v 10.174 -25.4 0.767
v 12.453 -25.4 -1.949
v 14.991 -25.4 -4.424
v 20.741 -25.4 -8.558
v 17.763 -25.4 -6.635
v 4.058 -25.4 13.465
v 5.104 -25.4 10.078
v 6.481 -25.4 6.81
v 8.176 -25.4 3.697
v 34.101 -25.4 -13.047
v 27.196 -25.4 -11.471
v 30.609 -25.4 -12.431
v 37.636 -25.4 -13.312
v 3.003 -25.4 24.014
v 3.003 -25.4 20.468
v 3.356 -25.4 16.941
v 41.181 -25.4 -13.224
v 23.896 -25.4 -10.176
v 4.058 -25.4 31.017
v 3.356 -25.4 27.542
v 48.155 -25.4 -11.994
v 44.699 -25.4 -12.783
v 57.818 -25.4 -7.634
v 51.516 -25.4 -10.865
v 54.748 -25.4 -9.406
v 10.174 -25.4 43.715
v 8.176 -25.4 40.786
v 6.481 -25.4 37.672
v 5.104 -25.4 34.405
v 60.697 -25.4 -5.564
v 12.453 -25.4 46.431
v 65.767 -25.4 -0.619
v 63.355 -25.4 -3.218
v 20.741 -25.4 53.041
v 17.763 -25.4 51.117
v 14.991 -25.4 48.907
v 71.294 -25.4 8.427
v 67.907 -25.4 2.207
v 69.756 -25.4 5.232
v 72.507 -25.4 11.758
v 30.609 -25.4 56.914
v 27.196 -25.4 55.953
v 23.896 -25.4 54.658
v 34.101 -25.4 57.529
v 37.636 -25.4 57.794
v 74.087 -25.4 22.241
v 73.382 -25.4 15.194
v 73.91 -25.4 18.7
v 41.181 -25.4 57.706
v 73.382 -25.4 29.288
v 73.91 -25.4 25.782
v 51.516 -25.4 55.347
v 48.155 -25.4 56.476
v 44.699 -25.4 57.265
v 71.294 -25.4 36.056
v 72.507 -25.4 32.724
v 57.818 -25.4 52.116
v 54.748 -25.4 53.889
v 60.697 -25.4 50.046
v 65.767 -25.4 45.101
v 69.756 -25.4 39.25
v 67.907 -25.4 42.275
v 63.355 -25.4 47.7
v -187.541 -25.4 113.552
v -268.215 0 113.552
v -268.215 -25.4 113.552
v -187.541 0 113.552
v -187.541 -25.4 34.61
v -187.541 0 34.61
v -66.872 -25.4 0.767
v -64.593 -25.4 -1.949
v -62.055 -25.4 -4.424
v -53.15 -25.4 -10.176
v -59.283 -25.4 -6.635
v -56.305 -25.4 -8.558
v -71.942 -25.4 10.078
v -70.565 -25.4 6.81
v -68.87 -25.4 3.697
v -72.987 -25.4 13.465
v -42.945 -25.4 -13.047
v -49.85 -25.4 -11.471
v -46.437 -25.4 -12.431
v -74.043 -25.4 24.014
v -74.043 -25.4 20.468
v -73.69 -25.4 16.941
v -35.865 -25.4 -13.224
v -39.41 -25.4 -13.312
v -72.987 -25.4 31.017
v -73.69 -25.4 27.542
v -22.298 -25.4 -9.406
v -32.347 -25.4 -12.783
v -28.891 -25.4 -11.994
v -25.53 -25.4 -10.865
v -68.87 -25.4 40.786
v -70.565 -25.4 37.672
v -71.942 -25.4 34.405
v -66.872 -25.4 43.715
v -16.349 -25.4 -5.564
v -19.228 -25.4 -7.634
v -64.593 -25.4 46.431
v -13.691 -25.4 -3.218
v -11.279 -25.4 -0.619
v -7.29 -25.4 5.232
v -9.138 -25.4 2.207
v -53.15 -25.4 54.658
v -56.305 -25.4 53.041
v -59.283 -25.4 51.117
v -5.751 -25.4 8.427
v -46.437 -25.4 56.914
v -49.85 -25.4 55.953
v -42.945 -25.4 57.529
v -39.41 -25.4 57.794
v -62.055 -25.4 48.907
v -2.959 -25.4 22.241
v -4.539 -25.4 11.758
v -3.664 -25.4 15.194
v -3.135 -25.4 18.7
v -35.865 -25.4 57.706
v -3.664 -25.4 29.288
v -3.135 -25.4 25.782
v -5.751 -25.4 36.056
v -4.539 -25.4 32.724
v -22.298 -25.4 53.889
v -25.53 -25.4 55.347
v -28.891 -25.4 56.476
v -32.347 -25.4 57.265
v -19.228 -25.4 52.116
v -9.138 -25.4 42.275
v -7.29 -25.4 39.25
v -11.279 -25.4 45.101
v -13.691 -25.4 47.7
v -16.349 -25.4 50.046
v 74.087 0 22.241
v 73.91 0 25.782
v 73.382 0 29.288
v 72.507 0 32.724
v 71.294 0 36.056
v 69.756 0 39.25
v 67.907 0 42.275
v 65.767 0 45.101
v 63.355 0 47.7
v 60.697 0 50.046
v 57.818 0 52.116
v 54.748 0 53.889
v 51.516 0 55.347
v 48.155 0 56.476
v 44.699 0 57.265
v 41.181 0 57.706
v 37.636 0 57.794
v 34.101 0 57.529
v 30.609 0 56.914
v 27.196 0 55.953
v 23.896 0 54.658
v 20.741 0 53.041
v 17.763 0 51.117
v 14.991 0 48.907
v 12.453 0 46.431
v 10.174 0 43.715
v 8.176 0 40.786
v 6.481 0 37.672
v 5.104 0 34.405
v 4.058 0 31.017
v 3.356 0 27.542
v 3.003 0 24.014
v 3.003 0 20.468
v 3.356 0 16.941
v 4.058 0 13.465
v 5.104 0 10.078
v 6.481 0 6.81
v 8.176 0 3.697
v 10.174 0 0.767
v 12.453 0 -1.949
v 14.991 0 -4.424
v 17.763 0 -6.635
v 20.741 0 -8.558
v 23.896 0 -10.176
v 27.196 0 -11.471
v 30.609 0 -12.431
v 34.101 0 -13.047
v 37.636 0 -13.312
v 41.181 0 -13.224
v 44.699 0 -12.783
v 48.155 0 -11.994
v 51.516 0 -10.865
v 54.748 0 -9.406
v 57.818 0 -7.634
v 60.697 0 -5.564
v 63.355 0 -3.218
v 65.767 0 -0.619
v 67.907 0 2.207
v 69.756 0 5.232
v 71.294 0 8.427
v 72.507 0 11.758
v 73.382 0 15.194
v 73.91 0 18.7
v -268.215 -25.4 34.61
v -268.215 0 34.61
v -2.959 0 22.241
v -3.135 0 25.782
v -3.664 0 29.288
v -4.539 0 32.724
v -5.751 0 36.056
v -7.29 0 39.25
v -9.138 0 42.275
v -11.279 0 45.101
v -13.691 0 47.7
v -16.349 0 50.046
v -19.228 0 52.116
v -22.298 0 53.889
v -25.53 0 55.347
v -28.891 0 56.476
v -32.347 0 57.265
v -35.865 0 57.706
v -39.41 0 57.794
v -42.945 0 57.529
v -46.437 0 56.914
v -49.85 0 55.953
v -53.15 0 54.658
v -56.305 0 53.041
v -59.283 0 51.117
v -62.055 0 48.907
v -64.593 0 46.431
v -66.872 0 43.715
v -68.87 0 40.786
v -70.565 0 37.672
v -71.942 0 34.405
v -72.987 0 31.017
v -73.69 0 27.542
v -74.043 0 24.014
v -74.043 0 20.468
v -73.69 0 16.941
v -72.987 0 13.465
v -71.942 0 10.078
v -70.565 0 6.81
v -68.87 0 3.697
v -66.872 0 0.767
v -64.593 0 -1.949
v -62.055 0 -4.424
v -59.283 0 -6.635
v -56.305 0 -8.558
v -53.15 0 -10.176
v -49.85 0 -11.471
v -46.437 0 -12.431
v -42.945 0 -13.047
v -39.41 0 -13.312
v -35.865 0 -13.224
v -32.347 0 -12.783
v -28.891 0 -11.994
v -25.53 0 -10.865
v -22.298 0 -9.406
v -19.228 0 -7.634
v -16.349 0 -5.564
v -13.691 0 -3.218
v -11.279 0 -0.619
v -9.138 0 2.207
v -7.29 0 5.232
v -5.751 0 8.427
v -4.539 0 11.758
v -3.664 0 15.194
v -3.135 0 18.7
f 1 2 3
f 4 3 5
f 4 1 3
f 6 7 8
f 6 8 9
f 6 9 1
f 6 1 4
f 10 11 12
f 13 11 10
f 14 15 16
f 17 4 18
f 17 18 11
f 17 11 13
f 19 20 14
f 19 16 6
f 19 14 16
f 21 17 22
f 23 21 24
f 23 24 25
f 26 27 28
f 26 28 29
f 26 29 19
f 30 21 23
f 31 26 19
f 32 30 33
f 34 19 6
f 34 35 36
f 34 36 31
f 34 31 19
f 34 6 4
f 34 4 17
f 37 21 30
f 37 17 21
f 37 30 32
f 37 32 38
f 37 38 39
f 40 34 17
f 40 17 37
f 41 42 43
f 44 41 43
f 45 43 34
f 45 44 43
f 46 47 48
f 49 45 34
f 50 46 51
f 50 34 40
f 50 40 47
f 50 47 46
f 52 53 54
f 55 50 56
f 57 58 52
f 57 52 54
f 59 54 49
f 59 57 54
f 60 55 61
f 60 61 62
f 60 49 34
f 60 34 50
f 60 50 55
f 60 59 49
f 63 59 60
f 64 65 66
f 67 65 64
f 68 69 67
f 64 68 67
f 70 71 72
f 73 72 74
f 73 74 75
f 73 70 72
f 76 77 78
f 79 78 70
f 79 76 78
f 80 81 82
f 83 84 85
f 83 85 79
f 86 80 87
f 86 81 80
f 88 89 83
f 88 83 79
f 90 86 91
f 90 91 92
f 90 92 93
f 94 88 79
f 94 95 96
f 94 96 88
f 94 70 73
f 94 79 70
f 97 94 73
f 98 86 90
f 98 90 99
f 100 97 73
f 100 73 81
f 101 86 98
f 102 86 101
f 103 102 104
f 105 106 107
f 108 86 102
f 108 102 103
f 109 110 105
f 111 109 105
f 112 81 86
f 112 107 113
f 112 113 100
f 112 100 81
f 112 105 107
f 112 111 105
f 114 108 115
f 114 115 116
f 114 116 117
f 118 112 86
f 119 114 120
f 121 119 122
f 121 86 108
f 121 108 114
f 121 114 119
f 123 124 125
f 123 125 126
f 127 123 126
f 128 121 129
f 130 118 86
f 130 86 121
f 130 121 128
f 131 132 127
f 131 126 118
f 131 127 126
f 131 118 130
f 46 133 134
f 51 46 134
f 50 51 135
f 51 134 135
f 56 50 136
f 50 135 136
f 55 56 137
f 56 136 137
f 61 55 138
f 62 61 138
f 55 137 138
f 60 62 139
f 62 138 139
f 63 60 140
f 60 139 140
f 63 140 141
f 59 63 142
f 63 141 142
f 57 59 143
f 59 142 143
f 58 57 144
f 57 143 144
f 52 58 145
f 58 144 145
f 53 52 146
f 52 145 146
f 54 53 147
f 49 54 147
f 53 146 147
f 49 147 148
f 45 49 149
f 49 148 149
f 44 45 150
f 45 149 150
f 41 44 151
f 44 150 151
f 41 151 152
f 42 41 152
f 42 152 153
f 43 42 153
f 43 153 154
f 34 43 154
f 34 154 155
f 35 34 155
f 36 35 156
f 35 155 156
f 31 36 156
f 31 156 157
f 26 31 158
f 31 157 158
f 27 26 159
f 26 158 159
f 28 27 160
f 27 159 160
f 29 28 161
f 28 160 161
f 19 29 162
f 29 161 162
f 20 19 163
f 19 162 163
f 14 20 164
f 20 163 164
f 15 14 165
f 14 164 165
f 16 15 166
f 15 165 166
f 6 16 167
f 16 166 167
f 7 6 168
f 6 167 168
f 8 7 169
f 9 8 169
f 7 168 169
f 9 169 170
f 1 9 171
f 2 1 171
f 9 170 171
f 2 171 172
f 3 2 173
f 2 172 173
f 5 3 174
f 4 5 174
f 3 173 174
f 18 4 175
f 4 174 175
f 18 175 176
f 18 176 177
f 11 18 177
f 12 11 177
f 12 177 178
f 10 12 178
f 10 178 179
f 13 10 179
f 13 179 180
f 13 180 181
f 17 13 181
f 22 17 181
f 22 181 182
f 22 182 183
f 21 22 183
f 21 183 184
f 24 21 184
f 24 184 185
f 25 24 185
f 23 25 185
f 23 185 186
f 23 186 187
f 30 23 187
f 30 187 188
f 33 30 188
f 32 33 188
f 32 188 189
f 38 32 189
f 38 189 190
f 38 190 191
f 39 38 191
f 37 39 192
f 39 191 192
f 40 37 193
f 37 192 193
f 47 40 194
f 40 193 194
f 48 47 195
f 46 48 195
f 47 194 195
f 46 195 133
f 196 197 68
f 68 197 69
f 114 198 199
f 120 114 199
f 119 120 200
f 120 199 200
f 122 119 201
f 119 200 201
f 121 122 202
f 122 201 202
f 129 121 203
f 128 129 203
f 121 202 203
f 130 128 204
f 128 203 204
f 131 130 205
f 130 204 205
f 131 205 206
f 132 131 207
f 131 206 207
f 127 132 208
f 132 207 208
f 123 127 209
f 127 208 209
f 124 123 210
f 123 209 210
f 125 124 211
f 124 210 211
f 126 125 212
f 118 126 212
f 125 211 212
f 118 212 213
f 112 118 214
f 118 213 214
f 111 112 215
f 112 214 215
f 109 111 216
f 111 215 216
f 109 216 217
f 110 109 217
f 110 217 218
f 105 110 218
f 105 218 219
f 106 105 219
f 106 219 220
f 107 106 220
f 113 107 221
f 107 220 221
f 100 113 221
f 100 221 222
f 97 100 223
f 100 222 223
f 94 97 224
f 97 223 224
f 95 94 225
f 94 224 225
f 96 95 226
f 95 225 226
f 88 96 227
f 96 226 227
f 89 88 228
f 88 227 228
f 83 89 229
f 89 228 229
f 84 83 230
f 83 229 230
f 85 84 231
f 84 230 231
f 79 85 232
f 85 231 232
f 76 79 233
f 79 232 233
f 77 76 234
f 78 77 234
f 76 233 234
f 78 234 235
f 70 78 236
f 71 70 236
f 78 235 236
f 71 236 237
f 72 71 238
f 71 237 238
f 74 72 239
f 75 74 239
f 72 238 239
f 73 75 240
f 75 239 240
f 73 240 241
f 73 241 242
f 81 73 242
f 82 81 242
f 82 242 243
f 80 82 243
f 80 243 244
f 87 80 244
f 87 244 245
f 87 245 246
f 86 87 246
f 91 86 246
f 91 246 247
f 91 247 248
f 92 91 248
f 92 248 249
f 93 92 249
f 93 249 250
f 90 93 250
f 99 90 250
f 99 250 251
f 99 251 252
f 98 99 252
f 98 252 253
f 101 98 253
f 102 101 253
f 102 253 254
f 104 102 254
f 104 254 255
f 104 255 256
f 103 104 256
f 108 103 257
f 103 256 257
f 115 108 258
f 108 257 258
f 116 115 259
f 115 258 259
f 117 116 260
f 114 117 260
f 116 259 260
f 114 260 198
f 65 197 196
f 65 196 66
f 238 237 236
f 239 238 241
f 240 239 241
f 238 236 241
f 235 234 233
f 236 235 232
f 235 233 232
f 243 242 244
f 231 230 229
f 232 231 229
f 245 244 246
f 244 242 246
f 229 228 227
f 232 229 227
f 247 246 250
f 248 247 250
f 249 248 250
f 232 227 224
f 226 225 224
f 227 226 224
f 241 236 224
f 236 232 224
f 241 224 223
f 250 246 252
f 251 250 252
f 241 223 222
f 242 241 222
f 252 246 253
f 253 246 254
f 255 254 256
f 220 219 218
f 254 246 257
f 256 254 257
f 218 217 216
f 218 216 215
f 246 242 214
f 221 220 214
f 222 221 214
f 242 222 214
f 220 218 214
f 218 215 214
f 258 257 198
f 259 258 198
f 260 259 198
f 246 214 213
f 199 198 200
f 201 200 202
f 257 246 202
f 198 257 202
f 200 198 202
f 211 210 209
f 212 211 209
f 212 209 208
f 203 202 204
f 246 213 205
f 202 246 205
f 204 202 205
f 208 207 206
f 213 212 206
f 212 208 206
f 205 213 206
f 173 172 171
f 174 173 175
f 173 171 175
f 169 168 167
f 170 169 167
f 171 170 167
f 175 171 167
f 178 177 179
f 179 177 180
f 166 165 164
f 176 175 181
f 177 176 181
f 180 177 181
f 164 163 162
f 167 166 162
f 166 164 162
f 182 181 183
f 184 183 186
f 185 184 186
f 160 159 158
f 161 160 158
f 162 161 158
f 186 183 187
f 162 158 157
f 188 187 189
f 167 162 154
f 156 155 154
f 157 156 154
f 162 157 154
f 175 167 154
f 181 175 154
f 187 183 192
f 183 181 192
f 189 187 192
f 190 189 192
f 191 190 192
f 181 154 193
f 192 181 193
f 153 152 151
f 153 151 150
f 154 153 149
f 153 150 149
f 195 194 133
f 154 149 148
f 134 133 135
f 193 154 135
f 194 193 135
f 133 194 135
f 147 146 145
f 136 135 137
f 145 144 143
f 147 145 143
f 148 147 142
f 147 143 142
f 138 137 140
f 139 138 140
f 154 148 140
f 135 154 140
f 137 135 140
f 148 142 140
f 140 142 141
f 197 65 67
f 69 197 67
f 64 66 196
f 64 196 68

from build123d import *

# Parameters (mm, degrees)
F0_R     = 35.5641883482
F1_DEPTH = 25.4
F3_W     = 80.6732773781
F3_H     = 78.9421647787
F4_DEPTH = 25.4


with BuildPart() as f1:
    # F0 (on Front) → F1 (new body)
    with BuildSketch(Plane.XZ):
        with Locations((-38.5229067204, 22.241210565)):
            Circle(F0_R)
    extrude(amount=F1_DEPTH)


with BuildPart() as f1b:
    # F0 (on Front) → F1, piece 2 (new body)
    with BuildSketch(Plane.XZ):
        with Locations((38.5229067204, 22.241210565)):
            Circle(F0_R)
    extrude(amount=F1_DEPTH)


with BuildPart() as f1c:
    # F0 (on Front) → F1, piece 3 (new body)
    with BuildSketch(Plane.XZ):
        with Locations((0, -44.4824211299)):
            Circle(F0_R)
    extrude(amount=F1_DEPTH)


with BuildPart() as f4:
    # F3 (on Front) → F4 (new body)
    with BuildSketch(Plane.XZ):
        with Locations((-227.8779149055, 74.0809887648)):
            Rectangle(F3_W, F3_H)
    extrude(amount=F4_DEPTH)


solid = Compound([f1.part, f1b.part, f4.part])
